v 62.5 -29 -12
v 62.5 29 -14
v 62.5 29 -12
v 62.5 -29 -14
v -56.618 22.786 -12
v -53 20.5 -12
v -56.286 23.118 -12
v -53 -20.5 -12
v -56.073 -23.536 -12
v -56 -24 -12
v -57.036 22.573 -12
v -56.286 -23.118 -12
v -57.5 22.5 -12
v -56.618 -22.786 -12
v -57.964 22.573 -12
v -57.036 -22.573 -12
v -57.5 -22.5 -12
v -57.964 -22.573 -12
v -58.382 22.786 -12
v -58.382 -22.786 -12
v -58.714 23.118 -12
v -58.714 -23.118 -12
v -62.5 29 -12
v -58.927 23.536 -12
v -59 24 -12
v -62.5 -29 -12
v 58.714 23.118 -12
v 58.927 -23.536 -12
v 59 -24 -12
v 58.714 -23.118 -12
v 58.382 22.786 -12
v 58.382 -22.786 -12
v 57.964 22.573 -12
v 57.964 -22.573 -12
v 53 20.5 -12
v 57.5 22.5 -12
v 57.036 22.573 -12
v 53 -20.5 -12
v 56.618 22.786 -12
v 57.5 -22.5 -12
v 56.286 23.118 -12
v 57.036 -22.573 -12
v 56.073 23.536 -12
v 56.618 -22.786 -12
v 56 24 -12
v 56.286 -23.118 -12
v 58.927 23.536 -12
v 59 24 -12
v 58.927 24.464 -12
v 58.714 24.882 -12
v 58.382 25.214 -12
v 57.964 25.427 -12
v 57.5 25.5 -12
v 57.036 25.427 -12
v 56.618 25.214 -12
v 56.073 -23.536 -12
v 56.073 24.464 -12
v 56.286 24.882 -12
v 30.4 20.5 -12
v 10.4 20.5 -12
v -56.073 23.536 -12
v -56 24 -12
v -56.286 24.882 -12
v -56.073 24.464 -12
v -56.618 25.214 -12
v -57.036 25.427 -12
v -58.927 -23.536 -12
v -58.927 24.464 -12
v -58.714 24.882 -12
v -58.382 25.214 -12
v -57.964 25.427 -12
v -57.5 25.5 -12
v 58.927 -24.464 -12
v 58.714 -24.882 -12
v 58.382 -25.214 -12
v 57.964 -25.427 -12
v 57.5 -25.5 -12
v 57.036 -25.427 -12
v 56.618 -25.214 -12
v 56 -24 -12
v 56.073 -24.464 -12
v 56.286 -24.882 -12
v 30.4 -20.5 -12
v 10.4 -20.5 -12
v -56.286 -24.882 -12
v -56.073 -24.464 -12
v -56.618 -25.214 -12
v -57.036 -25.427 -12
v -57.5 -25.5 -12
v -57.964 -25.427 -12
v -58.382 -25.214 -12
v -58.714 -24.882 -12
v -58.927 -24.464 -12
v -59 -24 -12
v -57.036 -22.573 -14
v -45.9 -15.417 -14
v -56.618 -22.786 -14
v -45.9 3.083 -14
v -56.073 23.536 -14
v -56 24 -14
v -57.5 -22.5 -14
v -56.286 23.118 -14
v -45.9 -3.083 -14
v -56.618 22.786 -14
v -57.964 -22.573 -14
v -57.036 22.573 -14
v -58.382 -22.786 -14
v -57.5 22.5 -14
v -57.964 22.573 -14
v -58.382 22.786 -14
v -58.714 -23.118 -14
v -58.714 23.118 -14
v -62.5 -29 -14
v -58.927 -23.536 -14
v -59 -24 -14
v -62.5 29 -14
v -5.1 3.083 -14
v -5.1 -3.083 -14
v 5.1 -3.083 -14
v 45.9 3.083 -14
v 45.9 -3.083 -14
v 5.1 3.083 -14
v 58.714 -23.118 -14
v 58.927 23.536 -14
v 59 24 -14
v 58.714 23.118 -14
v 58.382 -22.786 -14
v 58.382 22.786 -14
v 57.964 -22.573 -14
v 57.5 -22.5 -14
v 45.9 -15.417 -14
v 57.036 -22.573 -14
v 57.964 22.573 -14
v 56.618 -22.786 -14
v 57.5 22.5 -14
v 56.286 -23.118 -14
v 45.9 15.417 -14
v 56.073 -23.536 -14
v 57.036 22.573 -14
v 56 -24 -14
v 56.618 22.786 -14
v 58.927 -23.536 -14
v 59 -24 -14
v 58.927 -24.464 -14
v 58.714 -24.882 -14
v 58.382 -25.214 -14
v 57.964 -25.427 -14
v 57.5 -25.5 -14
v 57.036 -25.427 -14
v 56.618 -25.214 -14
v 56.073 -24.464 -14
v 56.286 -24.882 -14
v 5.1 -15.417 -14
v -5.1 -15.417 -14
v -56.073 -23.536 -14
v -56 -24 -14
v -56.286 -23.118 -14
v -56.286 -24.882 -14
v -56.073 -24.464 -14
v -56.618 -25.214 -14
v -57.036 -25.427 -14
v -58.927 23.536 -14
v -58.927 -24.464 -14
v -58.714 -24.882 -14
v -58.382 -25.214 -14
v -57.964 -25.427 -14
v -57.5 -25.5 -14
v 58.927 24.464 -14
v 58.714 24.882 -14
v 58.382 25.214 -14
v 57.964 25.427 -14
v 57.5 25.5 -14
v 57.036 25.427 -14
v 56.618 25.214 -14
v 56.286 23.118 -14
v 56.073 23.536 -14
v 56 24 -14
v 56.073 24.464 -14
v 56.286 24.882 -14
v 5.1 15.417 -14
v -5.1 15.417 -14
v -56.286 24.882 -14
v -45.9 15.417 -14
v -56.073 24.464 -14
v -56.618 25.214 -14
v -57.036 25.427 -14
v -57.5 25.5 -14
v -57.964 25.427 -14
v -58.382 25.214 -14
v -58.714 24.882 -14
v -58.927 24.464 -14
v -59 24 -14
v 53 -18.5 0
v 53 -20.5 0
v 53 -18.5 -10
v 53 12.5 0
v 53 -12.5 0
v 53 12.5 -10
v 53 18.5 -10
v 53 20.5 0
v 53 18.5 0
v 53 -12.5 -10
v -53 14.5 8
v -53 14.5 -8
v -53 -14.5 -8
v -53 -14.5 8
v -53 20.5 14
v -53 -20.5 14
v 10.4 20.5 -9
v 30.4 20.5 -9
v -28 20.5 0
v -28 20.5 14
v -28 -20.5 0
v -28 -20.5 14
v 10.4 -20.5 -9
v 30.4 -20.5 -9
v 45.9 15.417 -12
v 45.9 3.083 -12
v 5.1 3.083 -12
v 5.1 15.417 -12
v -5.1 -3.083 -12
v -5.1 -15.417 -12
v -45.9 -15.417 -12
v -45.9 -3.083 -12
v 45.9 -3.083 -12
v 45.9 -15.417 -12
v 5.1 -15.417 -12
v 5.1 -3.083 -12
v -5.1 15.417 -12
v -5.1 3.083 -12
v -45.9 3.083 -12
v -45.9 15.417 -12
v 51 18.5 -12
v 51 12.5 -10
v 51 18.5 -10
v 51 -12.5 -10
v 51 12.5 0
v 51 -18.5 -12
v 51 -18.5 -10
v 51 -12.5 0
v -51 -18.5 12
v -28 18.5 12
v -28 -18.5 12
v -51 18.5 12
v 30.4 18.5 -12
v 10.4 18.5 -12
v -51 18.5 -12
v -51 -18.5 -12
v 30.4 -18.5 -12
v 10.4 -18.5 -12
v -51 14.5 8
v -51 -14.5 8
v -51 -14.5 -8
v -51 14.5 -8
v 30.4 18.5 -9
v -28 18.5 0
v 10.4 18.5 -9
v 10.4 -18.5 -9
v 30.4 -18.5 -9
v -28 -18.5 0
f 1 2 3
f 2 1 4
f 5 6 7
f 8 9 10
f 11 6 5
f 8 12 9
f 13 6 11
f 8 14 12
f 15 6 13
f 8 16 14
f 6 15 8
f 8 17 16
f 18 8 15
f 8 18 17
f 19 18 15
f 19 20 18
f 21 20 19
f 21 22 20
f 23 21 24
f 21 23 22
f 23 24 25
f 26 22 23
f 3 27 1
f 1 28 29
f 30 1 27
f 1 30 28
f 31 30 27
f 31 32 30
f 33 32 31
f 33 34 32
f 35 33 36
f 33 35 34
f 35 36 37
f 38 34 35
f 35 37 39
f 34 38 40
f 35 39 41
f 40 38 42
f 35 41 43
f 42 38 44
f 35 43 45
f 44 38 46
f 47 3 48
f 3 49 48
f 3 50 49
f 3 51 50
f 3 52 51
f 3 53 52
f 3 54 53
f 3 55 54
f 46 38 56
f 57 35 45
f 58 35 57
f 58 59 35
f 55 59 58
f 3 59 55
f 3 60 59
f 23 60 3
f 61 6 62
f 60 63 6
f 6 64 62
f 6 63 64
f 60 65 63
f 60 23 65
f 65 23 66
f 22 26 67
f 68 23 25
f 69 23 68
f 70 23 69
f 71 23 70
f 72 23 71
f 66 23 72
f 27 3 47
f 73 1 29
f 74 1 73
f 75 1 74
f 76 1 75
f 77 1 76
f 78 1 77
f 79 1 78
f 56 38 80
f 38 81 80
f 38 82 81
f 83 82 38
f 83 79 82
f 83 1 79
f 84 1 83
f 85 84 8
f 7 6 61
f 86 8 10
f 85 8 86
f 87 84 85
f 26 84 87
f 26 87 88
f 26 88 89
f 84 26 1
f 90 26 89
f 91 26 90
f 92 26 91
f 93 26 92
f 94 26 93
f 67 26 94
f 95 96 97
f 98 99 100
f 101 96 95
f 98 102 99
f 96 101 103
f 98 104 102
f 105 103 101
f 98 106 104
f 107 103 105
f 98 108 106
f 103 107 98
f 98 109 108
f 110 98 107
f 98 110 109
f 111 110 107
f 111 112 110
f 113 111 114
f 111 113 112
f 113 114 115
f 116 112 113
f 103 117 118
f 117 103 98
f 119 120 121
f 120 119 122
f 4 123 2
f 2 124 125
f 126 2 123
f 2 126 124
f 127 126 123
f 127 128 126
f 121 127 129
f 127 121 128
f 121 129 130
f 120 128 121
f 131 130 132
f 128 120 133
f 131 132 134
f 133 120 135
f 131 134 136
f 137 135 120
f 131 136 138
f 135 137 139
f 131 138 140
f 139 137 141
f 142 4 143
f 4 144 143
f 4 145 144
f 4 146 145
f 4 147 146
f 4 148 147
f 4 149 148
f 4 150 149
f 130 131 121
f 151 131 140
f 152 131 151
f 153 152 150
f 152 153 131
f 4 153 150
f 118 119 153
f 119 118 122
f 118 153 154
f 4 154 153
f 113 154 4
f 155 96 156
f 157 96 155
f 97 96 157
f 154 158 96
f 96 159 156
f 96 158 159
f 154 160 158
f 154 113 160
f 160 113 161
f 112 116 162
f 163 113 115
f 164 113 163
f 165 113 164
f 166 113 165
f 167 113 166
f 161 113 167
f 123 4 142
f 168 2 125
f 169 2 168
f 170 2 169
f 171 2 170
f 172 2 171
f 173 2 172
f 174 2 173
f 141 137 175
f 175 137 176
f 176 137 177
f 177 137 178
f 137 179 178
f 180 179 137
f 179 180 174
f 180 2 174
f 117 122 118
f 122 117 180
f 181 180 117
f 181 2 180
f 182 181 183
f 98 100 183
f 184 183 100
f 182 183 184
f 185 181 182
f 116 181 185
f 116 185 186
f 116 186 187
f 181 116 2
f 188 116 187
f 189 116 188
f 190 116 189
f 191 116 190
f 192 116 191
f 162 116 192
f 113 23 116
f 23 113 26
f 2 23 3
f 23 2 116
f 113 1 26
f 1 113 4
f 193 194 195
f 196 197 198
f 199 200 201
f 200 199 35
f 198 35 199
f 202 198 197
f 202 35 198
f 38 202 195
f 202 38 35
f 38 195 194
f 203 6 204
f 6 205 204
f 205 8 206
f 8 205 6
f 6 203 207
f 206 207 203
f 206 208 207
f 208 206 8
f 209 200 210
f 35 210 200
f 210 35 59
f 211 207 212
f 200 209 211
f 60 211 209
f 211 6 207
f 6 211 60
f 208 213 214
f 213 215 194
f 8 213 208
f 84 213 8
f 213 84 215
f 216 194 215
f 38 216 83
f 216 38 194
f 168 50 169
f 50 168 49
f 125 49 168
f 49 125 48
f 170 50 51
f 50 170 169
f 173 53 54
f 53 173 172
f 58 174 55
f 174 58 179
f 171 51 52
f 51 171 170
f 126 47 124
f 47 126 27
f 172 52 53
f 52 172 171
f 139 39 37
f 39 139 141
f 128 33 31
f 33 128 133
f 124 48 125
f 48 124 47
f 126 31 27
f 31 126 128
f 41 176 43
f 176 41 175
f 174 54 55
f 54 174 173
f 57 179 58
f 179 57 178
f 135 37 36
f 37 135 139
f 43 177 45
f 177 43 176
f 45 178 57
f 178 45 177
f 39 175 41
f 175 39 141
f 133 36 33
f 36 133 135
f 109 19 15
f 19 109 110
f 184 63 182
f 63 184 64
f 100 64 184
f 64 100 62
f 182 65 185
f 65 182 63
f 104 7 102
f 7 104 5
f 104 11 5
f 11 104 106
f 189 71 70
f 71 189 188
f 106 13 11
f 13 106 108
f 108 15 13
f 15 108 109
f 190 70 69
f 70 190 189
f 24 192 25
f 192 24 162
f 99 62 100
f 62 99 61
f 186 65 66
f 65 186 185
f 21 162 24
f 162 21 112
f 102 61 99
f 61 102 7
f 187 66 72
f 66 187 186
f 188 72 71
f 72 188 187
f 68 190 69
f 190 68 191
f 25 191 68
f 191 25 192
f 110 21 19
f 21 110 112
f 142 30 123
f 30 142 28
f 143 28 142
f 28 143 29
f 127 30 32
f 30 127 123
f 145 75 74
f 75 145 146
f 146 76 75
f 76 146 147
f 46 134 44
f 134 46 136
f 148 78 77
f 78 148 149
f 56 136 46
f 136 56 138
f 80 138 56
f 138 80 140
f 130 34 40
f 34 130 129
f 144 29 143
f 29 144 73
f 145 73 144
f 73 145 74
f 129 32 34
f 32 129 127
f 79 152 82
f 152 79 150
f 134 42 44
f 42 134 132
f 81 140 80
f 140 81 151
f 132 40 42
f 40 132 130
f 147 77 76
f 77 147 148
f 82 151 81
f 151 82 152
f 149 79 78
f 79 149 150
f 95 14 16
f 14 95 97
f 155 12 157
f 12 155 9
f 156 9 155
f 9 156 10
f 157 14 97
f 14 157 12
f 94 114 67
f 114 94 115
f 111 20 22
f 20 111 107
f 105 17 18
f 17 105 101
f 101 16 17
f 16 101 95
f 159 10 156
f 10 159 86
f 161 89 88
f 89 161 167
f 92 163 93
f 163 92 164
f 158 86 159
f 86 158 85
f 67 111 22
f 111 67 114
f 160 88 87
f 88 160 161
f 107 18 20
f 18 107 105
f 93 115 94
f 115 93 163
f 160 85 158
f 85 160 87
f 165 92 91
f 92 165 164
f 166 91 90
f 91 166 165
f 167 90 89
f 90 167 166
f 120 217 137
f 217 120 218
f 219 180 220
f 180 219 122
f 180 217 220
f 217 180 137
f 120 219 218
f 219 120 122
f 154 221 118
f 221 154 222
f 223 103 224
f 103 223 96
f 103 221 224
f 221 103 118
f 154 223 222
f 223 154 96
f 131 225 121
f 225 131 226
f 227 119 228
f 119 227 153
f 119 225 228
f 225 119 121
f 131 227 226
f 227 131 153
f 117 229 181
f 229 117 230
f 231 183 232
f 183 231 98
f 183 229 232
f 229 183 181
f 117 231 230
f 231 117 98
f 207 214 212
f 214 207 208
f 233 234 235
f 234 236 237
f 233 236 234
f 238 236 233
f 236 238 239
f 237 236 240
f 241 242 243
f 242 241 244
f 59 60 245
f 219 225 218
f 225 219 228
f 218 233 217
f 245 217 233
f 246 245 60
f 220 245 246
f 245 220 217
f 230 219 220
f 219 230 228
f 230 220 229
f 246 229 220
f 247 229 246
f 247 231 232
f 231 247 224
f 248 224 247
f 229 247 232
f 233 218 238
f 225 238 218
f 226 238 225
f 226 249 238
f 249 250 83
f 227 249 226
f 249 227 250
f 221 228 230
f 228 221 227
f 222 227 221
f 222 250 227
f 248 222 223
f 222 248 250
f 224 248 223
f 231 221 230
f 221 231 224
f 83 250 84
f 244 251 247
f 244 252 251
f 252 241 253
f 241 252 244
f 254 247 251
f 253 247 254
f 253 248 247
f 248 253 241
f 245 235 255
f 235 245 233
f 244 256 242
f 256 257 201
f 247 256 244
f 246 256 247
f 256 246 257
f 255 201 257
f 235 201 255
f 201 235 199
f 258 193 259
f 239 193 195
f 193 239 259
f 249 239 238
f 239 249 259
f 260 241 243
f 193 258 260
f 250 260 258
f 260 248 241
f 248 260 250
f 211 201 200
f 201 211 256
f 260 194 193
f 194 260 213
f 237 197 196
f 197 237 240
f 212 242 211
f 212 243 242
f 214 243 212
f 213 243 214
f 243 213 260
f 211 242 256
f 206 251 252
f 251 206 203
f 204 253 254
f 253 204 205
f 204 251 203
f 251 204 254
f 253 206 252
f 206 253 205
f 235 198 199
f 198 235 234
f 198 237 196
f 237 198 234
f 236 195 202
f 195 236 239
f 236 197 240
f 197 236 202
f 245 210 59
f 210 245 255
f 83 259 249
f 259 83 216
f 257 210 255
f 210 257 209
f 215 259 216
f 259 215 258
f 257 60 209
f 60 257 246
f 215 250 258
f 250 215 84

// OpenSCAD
battery_length=102;
battery_height=24;
battery_width=37;
// high is not be tested it can be it will not fit in!
wall_height=2; // [3:low,2:medium,1.5:!high!]
thickness=2; // [1:3]
hole= 3; // [0:8]
sunk_screws=0; // [0:NO, 1:YES]
light=1; // [0:NO, 1:YES]
band_hole=1; // [0:NO, 1:YES]
thick_edge=0; // [0:NO, 1:YES]
//If you don't need it set to 0
mount_basis_length= 125;
//If you don't need it set to 0
mount_basis_width= 58;
mount_basis_thickness= 2; // [1:3]
//mount_basis_length need to be higher than
mb_hole_distance_length= 115;
//mount_basis_width need to be higher than
mb_hole_distance_width= 48;


module Akku(){
cube([battery_length,battery_width,battery_height],center=true);
}


module Case(L,B,H)
{
difference(){
cube([L,B,H],center=true);
Akku();


if(battery_length > 100)
{
translate([25,0,thickness+battery_height/wall_height]){
cube([L,B+0.5,H],center=true);
}
} else {
translate([battery_length/4,0,thickness+battery_height/wall_height]){
cube([L,B+0.5,H],center=true);
}
}

if(light==1)
{
translate([-L/2,0,0])
{
cube([L,battery_width-thickness*4,battery_height-thickness*4],center=true);
}
}



translate([L/2,battery_width/2-thickness*1.5,0])
{
cube([L,thickness*3,battery_height-thickness*2],center=true);
}
translate([L/2,-battery_width/2+thickness*1.5,0])
{
cube([L,thickness*3,battery_height-thickness*2],center=true);
}



if(thick_edge==1)
{
if(battery_length/5 > 20)
{
translate([battery_length,battery_width/2,0])
{
cube([battery_length+20,thickness*3,battery_height-thickness*2],center=true);
}
translate([battery_length,-battery_width/2,0])
{
cube([battery_length+20,thickness*3,battery_height-thickness*2],center=true);
}
} else{
translate([battery_length,battery_width/2,0])
{
cube([battery_length+battery_length/5,thickness*3,battery_height-thickness*2],center=true);
}
translate([battery_length,-battery_width/2,0])
{
cube([battery_length+battery_length/5,thickness*3,battery_height-thickness*2],center=true);
}
}
}



if(band_hole==1)
{
translate([battery_length/5,0,-battery_height/2+1.5])
{
if(battery_length > 60)
{
cube([20,battery_width+thickness*2+1,3],center=true);
} else {
cube([battery_length/3,battery_width+thickness*2+1,3],center=true);
}
}
}




if(light==1&&mb_hole_distance_length>battery_length+thickness*2||light==1&&mb_hole_distance_width>battery_width+thickness*2)
{
translate([battery_length/4,battery_width/4,-battery_height/2-0.1])
{
cube([battery_length/2.5,battery_width/3,thickness*2],center=true);
}
translate([-battery_length/4,-battery_width/4,-battery_height/2-0.1])
{
cube([battery_length/2.5,battery_width/3,thickness*2],center=true);
}
translate([battery_length/4,-battery_width/4,-battery_height/2-0.1])
{
cube([battery_length/2.5,battery_width/3,thickness*2],center=true);
}
translate([-battery_length/4,battery_width/4,-battery_height/2-0.1])
{
cube([battery_length/2.5,battery_width/3,thickness*2],center=true);
}
}else{
translate([mb_hole_distance_length/2,mb_hole_distance_width/2,(-battery_height-thickness*2)/2+mount_basis_thickness/2])
{
cylinder(d=hole,h=mount_basis_thickness*2,$fn=20,center=true);
}
translate([-mb_hole_distance_length/2,mb_hole_distance_width/2,(-battery_height-thickness*2)/2+mount_basis_thickness/2])
{
cylinder(d=hole,h=mount_basis_thickness*2,$fn=20,center=true);
}
translate([mb_hole_distance_length/2,-mb_hole_distance_width/2,(-battery_height-thickness*2)/2+mount_basis_thickness/2])
{
cylinder(d=hole,h=mount_basis_thickness*2,$fn=20,center=true);
}
translate([-mb_hole_distance_length/2,-mb_hole_distance_width/2,(-battery_height-thickness*2)/2+mount_basis_thickness/2])
{
cylinder(d=hole,h=mount_basis_thickness*2,$fn=20,center=true);
}
if(sunk_screws==1)
{
translate([mb_hole_distance_length/2,mb_hole_distance_width/2,(-battery_height-thickness*2)/2+mount_basis_thickness-hole/4])
{
cylinder(d1=hole,d2=hole*2,h=hole/2,$fn=20,center=true);
}
translate([-mb_hole_distance_length/2,mb_hole_distance_width/2,(-battery_height-thickness*2)/2+mount_basis_thickness-hole/4])
{
cylinder(d1=hole,d2=hole*2,h=hole/2,$fn=20,center=true);
}
translate([mb_hole_distance_length/2,-mb_hole_distance_width/2,(-battery_height-thickness*2)/2+mount_basis_thickness-hole/4])
{
cylinder(d1=hole,d2=hole*2,h=hole/2,$fn=20,center=true);
}
translate([-mb_hole_distance_length/2,-mb_hole_distance_width/2,(-battery_height-thickness*2)/2+mount_basis_thickness-hole/4])
{
cylinder(d1=hole,d2=hole*2,h=hole/2,$fn=20,center=true);
}
}    
}   
}
}






difference(){
translate([0,0,(-battery_height-thickness*2)/2+mount_basis_thickness/2])
{
cube([mount_basis_length,mount_basis_width,mount_basis_thickness],center=true);
}
translate([0,0,(-battery_height-thickness*2)/2+mount_basis_thickness/2])
{
cube([battery_length+thickness*2,battery_width+thickness*2,battery_height+thickness*2],center=true);
}



translate([mb_hole_distance_length/2,mb_hole_distance_width/2,(-battery_height-thickness*2)/2+mount_basis_thickness/2])
{
cylinder(d=hole,h=mount_basis_thickness*2,$fn=20,center=true);
}
translate([-mb_hole_distance_length/2,mb_hole_distance_width/2,(-battery_height-thickness*2)/2+mount_basis_thickness/2])
{
cylinder(d=hole,h=mount_basis_thickness*2,$fn=20,center=true);
}
translate([mb_hole_distance_length/2,-mb_hole_distance_width/2,(-battery_height-thickness*2)/2+mount_basis_thickness/2])
{
cylinder(d=hole,h=mount_basis_thickness*2,$fn=20,center=true);
}
translate([-mb_hole_distance_length/2,-mb_hole_distance_width/2,(-battery_height-thickness*2)/2+mount_basis_thickness/2])
{
cylinder(d=hole,h=mount_basis_thickness*2,$fn=20,center=true);
}





if(sunk_screws==1)
{
translate([mb_hole_distance_length/2,mb_hole_distance_width/2,(-battery_height-thickness*2)/2+mount_basis_thickness-hole/4])
{
cylinder(d1=hole,d2=hole*2,h=hole/2,$fn=20,center=true);
}
translate([-mb_hole_distance_length/2,mb_hole_distance_width/2,(-battery_height-thickness*2)/2+mount_basis_thickness-hole/4])
{
cylinder(d1=hole,d2=hole*2,h=hole/2,$fn=20,center=true);
}
translate([mb_hole_distance_length/2,-mb_hole_distance_width/2,(-battery_height-thickness*2)/2+mount_basis_thickness-hole/4])
{
cylinder(d1=hole,d2=hole*2,h=hole/2,$fn=20,center=true);
}
translate([-mb_hole_distance_length/2,-mb_hole_distance_width/2,(-battery_height-thickness*2)/2+mount_basis_thickness-hole/4])
{
cylinder(d1=hole,d2=hole*2,h=hole/2,$fn=20,center=true);
}
}
}




Case(battery_length+thickness*2,battery_width+thickness*2,battery_height+thickness*2); 
